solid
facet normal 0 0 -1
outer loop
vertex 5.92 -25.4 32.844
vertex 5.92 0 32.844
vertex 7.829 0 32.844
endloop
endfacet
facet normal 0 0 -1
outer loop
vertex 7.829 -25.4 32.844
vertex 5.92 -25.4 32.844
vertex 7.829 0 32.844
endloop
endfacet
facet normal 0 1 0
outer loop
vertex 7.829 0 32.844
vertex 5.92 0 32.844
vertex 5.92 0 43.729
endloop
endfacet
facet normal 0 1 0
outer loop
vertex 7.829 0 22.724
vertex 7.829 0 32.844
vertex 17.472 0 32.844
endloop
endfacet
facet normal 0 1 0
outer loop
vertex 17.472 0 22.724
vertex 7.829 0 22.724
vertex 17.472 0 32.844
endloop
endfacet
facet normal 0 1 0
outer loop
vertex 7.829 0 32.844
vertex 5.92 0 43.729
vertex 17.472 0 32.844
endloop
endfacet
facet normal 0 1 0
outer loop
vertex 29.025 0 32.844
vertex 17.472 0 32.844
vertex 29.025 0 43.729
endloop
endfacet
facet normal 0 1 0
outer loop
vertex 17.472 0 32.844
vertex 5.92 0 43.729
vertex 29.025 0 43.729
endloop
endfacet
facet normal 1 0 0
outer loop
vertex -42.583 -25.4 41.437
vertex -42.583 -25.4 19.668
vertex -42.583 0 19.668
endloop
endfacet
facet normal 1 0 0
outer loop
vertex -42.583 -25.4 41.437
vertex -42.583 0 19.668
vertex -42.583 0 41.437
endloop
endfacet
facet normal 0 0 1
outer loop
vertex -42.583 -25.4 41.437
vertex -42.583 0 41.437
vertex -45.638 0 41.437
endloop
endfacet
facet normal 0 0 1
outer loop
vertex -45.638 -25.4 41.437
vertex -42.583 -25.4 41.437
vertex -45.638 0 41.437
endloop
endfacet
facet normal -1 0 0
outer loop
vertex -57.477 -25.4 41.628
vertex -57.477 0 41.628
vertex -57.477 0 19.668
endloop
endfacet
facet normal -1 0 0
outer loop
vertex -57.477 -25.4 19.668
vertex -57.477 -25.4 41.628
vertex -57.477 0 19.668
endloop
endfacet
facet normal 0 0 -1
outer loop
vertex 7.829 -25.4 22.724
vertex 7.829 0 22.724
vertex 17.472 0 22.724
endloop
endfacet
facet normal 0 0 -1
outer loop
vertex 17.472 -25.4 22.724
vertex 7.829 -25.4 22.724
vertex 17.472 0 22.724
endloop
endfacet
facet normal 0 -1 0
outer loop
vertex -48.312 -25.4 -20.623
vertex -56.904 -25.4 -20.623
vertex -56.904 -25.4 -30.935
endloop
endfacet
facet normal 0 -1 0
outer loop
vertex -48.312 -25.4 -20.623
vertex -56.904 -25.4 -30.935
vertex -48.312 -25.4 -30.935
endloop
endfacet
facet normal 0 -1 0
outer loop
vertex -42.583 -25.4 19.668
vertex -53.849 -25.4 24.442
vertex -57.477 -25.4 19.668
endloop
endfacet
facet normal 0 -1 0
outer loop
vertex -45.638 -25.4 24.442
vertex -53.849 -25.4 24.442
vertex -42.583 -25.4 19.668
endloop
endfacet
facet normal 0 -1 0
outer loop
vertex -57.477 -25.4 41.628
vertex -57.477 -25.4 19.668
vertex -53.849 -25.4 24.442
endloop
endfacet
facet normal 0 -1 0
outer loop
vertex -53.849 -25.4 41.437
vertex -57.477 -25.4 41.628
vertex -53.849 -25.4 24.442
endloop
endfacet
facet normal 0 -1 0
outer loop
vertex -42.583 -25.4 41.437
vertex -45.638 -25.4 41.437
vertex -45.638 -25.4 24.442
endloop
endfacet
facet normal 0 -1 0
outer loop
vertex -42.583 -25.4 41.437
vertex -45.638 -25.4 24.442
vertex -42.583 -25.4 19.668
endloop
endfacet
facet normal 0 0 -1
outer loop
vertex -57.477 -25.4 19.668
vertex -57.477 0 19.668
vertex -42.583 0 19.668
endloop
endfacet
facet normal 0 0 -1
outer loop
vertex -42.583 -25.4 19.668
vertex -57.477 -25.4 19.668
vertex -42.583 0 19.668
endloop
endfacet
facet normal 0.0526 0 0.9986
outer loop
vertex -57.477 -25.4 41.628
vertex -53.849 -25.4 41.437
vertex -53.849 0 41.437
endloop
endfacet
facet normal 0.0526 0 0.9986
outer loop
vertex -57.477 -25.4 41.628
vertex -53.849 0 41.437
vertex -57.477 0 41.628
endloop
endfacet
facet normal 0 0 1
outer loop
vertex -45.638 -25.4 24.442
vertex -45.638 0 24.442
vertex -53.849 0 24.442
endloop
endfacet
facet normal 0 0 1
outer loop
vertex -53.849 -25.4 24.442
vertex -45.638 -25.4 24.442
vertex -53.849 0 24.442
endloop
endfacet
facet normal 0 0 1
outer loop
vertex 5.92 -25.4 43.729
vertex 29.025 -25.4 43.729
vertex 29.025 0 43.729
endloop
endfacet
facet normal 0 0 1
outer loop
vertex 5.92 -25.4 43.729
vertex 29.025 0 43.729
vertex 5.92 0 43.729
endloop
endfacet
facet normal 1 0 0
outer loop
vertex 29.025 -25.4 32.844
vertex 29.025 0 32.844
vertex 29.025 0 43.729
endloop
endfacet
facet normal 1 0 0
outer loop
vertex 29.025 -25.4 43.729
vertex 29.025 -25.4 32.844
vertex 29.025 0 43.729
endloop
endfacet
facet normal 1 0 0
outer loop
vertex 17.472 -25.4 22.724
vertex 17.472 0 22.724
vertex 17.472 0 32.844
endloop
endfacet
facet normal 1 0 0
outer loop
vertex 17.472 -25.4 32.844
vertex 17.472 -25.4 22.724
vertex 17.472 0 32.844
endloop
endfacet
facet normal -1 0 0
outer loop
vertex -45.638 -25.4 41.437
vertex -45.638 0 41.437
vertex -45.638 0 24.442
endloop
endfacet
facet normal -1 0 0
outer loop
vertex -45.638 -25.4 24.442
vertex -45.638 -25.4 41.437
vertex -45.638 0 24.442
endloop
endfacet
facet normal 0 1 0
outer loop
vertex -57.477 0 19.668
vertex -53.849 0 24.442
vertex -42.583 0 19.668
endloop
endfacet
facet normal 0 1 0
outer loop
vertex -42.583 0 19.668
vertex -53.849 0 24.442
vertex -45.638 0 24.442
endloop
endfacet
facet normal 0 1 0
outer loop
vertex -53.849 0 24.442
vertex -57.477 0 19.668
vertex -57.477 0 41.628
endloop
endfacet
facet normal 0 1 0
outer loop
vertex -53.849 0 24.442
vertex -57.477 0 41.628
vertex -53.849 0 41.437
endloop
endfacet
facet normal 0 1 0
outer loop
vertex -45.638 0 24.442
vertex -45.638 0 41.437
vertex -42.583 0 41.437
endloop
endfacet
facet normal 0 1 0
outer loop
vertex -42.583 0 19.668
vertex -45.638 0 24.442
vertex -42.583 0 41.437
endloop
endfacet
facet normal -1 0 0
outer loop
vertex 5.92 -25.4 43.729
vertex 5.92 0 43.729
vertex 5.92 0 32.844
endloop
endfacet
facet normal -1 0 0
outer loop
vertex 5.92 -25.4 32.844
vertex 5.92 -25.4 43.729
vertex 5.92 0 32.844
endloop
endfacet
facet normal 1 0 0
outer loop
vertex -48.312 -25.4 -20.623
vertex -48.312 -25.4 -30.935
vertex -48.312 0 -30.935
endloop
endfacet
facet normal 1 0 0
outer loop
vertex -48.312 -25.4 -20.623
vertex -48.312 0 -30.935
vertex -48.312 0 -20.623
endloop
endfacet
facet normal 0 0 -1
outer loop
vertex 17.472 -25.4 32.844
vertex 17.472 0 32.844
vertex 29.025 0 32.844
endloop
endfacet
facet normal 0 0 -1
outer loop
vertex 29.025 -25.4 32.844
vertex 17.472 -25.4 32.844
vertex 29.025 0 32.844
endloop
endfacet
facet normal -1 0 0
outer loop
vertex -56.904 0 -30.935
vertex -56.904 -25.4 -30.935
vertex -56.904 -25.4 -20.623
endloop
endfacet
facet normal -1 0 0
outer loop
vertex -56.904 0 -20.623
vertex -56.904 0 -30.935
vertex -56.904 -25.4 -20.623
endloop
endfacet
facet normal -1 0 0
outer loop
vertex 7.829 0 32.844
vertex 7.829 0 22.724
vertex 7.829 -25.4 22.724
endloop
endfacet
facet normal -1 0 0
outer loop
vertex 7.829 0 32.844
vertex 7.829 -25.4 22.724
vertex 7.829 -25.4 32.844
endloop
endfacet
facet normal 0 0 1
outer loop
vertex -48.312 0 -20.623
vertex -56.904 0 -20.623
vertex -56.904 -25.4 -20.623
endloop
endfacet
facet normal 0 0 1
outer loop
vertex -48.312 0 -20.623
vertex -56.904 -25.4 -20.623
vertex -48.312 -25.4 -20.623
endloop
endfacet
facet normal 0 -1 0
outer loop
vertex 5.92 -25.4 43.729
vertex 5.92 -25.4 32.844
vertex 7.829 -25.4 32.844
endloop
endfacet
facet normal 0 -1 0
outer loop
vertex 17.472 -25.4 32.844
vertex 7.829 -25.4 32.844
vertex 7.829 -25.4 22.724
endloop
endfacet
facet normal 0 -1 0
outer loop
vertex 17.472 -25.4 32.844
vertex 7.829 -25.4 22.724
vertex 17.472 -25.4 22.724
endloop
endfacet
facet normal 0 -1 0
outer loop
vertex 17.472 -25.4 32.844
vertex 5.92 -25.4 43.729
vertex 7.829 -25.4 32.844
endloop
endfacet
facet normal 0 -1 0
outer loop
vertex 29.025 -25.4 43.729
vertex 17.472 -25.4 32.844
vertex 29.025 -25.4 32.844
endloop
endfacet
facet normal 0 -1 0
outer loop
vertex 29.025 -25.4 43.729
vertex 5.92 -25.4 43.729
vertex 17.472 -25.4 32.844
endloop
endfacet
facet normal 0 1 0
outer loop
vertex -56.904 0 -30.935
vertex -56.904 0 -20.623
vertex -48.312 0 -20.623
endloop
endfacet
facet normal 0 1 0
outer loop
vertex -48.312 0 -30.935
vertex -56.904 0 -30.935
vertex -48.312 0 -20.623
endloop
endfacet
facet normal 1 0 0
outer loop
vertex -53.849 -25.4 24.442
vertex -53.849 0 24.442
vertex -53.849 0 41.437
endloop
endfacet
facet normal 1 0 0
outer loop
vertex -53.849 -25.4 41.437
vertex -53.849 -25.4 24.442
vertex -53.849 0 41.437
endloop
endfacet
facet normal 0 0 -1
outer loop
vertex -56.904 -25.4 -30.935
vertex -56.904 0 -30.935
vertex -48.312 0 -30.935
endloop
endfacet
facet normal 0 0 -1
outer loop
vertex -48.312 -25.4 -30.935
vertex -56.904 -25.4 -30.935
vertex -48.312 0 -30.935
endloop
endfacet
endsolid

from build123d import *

# Parameters (mm, degrees)
F1_DEPTH = 25.4
F2_W     = 9.6432107966
F2_H     = 10.1205967367
F3_DEPTH = 25.4
F4_W     = 8.5929594934
F4_H     = 10.3115532547
F5_DEPTH = 25.4


with BuildPart() as f1:
    # F0 (on Front) → F1 (new body)
    with BuildSketch(Plane.XZ):
        Polygon((-53.8492128253, 41.4371602237), (-57.4773512781, 41.6281148791), (-57.4773512781, 19.6683295071), (-42.5828881562, 19.6683295071), (-42.5828881562, 41.4371602237), (-45.6381626427, 41.4371602237), (-45.6381626427, 24.442197755), (-53.8492128253, 24.442197755), align=None)
    extrude(amount=F1_DEPTH)


with BuildPart() as f3:
    # F2 (on Front) → F3 (new body)
    with BuildSketch(Plane.XZ):
        Polygon((29.0251094848, 43.7286160886), (5.919593852, 43.7286160886), (5.919593852, 32.8442007303), (7.8291408718, 32.8442007303), (17.4723516684, 32.8442007303), (29.0251094848, 32.8442007303), align=None)
        with Locations((12.6507462701, 27.783902362)):
            Rectangle(F2_W, F2_H)
    extrude(amount=F3_DEPTH)


with BuildPart() as f5:
    # F4 (on Front) → F5 (new body)
    with BuildSketch(Plane.XZ):
        with Locations((-52.6080075651, -25.7788794115)):
            Rectangle(F4_W, F4_H)
    extrude(amount=F5_DEPTH)


solid = Compound([f1.part, f3.part, f5.part])
